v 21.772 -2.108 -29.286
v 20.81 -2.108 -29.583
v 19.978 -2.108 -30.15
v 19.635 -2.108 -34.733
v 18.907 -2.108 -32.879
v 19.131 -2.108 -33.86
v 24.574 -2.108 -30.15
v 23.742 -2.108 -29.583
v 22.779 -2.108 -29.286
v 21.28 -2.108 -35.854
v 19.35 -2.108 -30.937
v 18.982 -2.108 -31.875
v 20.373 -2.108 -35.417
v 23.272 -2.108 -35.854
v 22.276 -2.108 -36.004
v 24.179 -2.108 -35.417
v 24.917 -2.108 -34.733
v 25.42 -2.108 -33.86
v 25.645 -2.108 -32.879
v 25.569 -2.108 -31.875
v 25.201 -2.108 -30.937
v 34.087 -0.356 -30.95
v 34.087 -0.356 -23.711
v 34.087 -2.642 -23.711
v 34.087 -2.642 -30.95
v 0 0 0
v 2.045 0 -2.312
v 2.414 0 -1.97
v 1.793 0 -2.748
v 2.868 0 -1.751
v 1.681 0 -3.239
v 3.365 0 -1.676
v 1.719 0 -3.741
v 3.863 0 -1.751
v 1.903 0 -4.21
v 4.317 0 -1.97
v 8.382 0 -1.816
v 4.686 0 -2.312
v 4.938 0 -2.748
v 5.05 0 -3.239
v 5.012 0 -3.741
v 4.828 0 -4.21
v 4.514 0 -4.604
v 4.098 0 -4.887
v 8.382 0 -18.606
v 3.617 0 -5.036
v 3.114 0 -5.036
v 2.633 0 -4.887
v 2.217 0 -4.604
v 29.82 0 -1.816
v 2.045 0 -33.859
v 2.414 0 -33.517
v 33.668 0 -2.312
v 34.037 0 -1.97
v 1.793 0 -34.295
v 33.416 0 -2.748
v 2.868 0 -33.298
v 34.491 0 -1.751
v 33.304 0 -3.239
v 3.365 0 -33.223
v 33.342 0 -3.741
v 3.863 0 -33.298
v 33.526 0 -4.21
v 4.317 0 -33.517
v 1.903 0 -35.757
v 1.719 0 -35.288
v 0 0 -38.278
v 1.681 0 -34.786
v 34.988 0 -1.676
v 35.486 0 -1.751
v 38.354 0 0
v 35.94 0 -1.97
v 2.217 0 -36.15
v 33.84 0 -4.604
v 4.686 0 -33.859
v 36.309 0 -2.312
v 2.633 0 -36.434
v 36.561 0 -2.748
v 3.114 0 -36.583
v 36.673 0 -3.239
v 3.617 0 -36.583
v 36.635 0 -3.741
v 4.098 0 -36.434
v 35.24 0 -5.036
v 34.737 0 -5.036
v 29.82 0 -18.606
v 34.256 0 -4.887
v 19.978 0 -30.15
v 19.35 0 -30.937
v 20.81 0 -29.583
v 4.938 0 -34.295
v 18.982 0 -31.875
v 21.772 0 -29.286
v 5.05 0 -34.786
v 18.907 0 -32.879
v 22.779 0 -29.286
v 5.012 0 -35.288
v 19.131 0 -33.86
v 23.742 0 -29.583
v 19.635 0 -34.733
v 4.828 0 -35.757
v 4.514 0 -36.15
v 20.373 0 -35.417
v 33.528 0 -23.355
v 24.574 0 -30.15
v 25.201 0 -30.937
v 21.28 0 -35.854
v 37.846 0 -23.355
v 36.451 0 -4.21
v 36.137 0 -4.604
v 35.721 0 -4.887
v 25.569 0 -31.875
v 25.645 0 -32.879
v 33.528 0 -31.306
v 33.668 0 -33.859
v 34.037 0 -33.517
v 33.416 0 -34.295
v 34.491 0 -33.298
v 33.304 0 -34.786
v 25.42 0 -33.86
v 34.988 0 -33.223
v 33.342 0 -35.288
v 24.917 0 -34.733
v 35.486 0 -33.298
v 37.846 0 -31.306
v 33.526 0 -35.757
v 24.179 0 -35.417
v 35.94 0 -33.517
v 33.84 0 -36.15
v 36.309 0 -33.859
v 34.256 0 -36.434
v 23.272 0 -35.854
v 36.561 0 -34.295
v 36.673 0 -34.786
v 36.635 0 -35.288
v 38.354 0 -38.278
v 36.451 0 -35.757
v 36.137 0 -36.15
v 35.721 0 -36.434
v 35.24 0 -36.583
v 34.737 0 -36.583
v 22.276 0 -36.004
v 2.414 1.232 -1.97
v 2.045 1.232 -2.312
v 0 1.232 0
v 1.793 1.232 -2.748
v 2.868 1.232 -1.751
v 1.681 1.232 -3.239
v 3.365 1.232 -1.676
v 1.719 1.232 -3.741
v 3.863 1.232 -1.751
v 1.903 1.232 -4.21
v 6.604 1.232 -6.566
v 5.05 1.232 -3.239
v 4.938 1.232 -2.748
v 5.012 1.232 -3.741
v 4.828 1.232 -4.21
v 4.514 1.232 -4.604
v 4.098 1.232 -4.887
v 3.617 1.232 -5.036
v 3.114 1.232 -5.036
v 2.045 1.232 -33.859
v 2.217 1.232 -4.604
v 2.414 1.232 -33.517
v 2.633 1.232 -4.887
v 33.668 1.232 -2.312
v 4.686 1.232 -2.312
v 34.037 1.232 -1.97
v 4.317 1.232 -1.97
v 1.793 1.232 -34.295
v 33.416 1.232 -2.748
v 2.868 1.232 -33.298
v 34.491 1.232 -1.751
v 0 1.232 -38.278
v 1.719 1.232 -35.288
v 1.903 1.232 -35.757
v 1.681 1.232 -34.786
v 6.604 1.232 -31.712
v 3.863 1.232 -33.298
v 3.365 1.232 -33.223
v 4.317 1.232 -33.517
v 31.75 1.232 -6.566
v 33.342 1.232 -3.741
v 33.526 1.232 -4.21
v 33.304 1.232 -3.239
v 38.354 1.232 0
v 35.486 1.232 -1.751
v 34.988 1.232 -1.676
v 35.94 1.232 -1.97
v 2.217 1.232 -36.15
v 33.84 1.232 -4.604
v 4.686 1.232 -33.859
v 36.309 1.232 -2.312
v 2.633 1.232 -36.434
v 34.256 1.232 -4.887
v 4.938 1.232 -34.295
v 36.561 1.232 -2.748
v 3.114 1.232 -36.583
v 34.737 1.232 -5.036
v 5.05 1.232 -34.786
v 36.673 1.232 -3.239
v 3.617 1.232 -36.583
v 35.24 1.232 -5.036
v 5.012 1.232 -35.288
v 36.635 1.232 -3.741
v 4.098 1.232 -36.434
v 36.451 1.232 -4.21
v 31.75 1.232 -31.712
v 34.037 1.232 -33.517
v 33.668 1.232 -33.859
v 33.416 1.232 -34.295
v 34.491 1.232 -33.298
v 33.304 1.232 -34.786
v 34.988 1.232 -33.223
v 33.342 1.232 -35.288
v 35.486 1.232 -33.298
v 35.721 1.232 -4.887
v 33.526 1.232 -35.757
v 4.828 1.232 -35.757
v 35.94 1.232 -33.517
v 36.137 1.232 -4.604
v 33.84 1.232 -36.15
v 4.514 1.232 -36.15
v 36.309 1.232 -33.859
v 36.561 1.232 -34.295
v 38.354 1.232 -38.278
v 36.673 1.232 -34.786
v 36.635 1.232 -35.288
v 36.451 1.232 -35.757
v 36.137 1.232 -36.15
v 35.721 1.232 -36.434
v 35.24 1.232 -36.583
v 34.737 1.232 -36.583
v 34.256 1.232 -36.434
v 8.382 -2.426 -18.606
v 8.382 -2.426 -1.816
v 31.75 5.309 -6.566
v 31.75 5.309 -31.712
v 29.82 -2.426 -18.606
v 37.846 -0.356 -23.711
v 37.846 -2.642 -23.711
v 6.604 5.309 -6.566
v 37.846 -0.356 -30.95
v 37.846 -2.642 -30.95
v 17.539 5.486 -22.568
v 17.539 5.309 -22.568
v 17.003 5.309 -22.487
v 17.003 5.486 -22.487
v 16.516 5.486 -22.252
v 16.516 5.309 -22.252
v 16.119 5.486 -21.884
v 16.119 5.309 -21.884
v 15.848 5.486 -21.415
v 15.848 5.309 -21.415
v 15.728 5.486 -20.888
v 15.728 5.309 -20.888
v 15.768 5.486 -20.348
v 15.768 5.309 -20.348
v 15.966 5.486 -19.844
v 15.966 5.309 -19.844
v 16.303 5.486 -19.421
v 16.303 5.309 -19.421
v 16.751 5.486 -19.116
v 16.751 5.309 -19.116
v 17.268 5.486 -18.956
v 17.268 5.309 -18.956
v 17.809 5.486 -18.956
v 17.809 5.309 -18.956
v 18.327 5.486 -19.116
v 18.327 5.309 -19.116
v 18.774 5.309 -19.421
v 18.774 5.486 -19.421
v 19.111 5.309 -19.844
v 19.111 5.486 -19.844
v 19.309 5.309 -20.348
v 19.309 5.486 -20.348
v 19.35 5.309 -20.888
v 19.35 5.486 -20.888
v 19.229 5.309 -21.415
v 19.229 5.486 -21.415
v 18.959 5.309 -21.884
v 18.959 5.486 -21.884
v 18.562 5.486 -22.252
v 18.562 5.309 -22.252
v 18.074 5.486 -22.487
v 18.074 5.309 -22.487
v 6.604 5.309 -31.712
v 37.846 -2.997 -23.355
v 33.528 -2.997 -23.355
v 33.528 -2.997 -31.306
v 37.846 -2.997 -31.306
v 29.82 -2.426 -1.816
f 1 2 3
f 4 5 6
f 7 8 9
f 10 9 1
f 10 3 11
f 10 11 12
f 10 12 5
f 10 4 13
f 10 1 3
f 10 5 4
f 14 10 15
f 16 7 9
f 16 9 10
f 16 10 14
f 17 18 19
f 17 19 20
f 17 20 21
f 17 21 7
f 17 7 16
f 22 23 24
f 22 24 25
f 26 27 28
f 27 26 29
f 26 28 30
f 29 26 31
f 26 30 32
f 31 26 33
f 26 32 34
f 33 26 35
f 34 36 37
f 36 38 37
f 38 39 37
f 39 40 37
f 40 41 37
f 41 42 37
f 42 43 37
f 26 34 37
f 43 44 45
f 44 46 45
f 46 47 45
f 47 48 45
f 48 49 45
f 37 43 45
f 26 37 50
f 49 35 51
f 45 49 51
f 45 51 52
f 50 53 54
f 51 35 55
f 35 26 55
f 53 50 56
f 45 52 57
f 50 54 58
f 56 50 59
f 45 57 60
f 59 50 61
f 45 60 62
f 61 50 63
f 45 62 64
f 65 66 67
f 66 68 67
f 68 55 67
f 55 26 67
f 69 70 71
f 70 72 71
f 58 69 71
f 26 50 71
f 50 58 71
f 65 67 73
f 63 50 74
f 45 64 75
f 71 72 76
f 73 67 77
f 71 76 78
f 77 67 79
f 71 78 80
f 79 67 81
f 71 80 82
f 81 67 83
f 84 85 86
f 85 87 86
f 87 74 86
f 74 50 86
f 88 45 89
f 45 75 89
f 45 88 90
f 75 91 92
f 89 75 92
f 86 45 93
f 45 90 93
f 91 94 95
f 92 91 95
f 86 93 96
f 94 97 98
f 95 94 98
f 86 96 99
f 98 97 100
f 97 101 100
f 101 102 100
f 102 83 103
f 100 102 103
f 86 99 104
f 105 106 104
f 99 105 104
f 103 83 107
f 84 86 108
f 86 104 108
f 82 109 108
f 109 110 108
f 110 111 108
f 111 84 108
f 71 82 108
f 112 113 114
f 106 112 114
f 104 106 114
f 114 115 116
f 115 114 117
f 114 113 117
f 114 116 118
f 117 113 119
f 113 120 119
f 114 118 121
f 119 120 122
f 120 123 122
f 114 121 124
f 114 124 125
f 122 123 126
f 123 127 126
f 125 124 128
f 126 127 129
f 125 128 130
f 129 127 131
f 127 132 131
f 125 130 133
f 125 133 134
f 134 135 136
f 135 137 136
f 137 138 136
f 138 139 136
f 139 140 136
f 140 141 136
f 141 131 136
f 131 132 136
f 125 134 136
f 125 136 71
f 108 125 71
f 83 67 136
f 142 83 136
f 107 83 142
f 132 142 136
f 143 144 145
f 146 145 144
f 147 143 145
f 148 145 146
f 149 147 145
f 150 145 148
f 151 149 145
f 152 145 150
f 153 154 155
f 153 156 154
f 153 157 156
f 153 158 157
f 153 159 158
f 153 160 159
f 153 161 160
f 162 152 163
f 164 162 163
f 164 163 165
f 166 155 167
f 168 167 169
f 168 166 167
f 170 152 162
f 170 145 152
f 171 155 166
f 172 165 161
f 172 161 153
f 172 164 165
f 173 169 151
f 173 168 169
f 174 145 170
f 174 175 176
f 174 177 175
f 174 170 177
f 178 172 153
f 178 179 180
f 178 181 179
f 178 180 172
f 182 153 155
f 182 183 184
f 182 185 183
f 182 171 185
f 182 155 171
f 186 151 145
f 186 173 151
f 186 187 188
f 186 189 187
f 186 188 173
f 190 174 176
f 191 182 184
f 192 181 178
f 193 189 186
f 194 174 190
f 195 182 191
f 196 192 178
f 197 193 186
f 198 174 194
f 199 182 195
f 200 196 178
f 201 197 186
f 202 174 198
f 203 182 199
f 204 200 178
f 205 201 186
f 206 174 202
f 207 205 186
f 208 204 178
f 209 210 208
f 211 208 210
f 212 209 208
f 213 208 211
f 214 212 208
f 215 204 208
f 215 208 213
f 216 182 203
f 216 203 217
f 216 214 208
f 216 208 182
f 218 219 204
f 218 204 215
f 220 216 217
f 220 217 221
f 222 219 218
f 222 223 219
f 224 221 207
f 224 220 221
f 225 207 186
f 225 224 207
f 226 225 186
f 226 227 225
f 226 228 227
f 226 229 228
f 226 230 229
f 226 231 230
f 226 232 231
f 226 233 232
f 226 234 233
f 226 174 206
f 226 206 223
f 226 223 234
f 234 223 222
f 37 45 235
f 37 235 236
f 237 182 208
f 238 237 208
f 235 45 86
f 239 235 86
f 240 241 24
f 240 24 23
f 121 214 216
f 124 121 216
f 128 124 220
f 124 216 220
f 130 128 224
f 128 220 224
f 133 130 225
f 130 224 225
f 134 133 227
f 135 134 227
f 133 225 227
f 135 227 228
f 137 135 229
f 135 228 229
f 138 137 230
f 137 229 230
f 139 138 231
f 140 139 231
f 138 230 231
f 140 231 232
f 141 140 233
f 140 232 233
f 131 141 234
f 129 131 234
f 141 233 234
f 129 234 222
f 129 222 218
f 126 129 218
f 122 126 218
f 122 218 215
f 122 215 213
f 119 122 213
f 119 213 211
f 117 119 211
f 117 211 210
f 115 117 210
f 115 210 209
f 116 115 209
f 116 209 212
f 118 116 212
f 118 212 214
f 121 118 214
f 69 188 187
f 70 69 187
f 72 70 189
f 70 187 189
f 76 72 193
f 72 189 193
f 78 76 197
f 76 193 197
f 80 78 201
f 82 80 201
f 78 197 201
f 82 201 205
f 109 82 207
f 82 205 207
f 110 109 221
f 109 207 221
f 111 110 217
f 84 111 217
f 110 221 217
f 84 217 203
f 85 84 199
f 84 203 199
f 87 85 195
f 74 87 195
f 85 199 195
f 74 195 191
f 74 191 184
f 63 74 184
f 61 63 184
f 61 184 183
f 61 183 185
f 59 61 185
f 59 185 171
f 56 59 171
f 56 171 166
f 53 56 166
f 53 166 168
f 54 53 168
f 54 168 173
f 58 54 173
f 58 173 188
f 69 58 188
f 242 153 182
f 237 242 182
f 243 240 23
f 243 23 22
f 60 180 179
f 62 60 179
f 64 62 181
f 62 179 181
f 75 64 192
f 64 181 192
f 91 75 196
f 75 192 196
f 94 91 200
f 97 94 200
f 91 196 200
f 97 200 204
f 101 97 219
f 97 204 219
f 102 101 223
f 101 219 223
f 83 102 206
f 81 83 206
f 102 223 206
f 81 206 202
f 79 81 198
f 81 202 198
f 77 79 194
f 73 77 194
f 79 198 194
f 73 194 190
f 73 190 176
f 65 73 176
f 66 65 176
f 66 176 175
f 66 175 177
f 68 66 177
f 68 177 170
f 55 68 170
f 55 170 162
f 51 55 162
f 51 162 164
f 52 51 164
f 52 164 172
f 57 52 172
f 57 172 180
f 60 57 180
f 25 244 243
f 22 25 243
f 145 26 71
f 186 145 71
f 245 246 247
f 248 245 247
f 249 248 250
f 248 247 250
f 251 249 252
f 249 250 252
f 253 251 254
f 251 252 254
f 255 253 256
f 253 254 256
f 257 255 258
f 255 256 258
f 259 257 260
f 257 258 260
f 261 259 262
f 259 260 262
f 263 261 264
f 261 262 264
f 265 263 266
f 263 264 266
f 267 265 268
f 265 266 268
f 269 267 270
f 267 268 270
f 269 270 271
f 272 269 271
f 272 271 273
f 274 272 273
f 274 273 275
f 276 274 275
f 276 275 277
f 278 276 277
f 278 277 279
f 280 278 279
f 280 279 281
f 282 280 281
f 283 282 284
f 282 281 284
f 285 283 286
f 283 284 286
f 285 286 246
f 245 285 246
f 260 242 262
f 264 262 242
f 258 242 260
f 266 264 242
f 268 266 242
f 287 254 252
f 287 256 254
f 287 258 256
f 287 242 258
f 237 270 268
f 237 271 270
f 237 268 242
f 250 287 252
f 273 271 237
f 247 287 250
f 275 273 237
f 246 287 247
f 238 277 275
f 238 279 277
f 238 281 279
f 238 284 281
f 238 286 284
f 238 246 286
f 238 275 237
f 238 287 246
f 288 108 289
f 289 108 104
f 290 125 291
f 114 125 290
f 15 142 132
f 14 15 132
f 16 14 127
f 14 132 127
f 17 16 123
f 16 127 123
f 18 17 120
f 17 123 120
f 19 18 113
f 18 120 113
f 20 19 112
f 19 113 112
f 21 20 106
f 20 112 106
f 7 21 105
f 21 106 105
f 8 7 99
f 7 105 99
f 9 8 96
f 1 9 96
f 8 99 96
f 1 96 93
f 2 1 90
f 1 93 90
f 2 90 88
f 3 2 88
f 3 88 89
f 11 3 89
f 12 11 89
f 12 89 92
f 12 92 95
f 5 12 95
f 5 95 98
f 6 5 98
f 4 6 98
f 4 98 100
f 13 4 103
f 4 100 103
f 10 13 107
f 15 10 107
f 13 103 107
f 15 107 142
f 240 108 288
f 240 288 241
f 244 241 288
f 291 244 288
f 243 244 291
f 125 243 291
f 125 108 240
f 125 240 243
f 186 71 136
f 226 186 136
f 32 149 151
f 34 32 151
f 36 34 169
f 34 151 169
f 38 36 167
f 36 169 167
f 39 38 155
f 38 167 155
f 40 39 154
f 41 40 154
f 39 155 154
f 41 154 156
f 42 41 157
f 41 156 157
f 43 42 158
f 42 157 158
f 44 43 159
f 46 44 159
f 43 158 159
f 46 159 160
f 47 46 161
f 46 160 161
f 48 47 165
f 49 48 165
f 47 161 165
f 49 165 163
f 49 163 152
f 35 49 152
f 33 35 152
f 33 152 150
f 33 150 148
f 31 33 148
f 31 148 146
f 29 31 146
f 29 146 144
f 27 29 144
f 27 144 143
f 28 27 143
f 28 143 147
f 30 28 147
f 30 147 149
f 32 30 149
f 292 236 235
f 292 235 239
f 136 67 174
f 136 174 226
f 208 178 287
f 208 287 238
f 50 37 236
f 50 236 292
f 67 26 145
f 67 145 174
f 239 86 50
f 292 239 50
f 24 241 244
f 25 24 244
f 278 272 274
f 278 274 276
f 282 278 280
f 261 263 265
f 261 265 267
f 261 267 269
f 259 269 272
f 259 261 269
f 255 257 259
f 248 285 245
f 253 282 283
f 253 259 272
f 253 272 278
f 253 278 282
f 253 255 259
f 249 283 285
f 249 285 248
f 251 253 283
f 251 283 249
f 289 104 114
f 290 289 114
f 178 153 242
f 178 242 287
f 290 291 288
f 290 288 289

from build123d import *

# Parameters (mm, degrees)
SKETCH1_W           = 38.354
SKETCH1_H           = 38.2778
BOARD_DEPTH         = 1.2319
SKETCH3_W           = 25.146
SKETCH3_H           = 25.146
GPS_DEPTH           = 4.0767
SKETCH5_W           = 21.4376
SKETCH5_H           = 16.7894
UBLOCK_CHIP_DEPTH   = 2.4257
SKETCH6_R           = 3.3782
BATTERY_DEPTH       = 2.1082
SKETCH7_W           = 4.318
SKETCH7_H           = 7.9502
CONNECTOR_DEPTH     = 2.9972
SKETCH8_W           = 7.239
SKETCH8_H           = 2.286
CUT_EXTRUDE1_DEPTH  = 3.7592
CUT_EXTRUDE2_REACH  = 56.352
SKETCH9_R           = 1.6891
SKETCH10_R          = 1.8161
BOSS_EXTRUDE6_DEPTH = 0.1778


with BuildPart() as part:
    # Sketch1 → Board (new body)
    with BuildSketch(Plane(origin=(0, 0, 0), x_dir=(1, 0, 0), z_dir=(0, 1, 0))):
        with Locations((19.177, 19.1389)):
            Rectangle(SKETCH1_W, SKETCH1_H)
    extrude(amount=BOARD_DEPTH)

    # Sketch3 → GPS (add)
    with BuildSketch(Plane(origin=(0, 1.2319, 0), x_dir=(1, 0, 0), z_dir=(0, 1, 0))):
        with Locations((19.177, 19.1389)):
            Rectangle(SKETCH3_W, SKETCH3_H)
    extrude(amount=GPS_DEPTH)

    # Sketch5 → uBlock chip (add)
    with BuildSketch(Plane.XZ):
        with Locations((19.1008, -10.2108)):
            Rectangle(SKETCH5_W, SKETCH5_H)
    extrude(amount=UBLOCK_CHIP_DEPTH)

    # Sketch6 → Battery (add)
    with BuildSketch(Plane(origin=(0, 0, 0), x_dir=(-1, 0, 0), z_dir=(0, -1, 0))):
        with Locations(Location((-22.2758, 32.6263, 0), (0, 0, 90))):
            Circle(SKETCH6_R)
    extrude(amount=BATTERY_DEPTH)

    # Sketch7 → Connector (add)
    with BuildSketch(Plane(origin=(0, 0, 0), x_dir=(-1, 0, 0), z_dir=(0, -1, 0))):
        with Locations((-35.687, 27.3304)):
            Rectangle(SKETCH7_W, SKETCH7_H)
    extrude(amount=CONNECTOR_DEPTH)

    # Sketch8 → Cut-Extrude1 (cut)
    with BuildSketch(Plane(origin=(37.846, 0, 0), x_dir=(0, 0, -1), z_dir=(1, 0, 0))):
        with Locations((27.3304, -1.4986)):
            Rectangle(SKETCH8_W, SKETCH8_H)
    extrude(amount=-CUT_EXTRUDE1_DEPTH, mode=Mode.SUBTRACT)

    # Sketch9 → Cut-Extrude2 (cut, up to next)
    with BuildSketch(Plane(origin=(0, 1.2319, 0), x_dir=(1, 0, 0), z_dir=(0, 1, 0)), mode=Mode.PRIVATE) as cut_extrude2_sk1:
        with Locations(Location((34.9885, 3.3655, 0), (0, 0, 270))):
            Circle(SKETCH9_R)
    cut_extrude2_tool1 = extrude(cut_extrude2_sk1.sketch, amount=-CUT_EXTRUDE2_REACH, mode=Mode.PRIVATE) & part.part
    # Sketch9 → Cut-Extrude2 (cut, up to next)
    with BuildSketch(Plane(origin=(0, 1.2319, 0), x_dir=(1, 0, 0), z_dir=(0, 1, 0)), mode=Mode.PRIVATE) as cut_extrude2_sk2:
        with Locations(Location((3.3655, 3.3655, 0), (0, 0, 270))):
            Circle(SKETCH9_R)
    cut_extrude2_tool2 = extrude(cut_extrude2_sk2.sketch, amount=-CUT_EXTRUDE2_REACH, mode=Mode.PRIVATE) & part.part
    # Sketch9 → Cut-Extrude2 (cut, up to next)
    with BuildSketch(Plane(origin=(0, 1.2319, 0), x_dir=(1, 0, 0), z_dir=(0, 1, 0)), mode=Mode.PRIVATE) as cut_extrude2_sk3:
        with Locations(Location((3.3655, 34.9123, 0), (0, 0, 270))):
            Circle(SKETCH9_R)
    cut_extrude2_tool3 = extrude(cut_extrude2_sk3.sketch, amount=-CUT_EXTRUDE2_REACH, mode=Mode.PRIVATE) & part.part
    # Sketch9 → Cut-Extrude2 (cut, up to next)
    with BuildSketch(Plane(origin=(0, 1.2319, 0), x_dir=(1, 0, 0), z_dir=(0, 1, 0)), mode=Mode.PRIVATE) as cut_extrude2_sk4:
        with Locations(Location((34.9885, 34.9123, 0), (0, 0, 270))):
            Circle(SKETCH9_R)
    cut_extrude2_tool4 = extrude(cut_extrude2_sk4.sketch, amount=-CUT_EXTRUDE2_REACH, mode=Mode.PRIVATE) & part.part
    add(cut_extrude2_tool1.solids().sort_by_distance((34.9885, 1.2319, -3.3655))[0], mode=Mode.SUBTRACT)
    add(cut_extrude2_tool2.solids().sort_by_distance((3.3655, 1.2319, -3.3655))[0], mode=Mode.SUBTRACT)
    add(cut_extrude2_tool3.solids().sort_by_distance((3.3655, 1.2319, -34.9123))[0], mode=Mode.SUBTRACT)
    add(cut_extrude2_tool4.solids().sort_by_distance((34.9885, 1.2319, -34.9123))[0], mode=Mode.SUBTRACT)

    # Sketch10 → Boss-Extrude6 (add)
    with BuildSketch(Plane(origin=(0, 5.3086, 0), x_dir=(1, 0, 0), z_dir=(0, 1, 0))):
        with Locations(Location((17.5387, 20.7518, 0), (0, 0, 90))):
            Circle(SKETCH10_R)
    extrude(amount=BOSS_EXTRUDE6_DEPTH)


solid = part.part
